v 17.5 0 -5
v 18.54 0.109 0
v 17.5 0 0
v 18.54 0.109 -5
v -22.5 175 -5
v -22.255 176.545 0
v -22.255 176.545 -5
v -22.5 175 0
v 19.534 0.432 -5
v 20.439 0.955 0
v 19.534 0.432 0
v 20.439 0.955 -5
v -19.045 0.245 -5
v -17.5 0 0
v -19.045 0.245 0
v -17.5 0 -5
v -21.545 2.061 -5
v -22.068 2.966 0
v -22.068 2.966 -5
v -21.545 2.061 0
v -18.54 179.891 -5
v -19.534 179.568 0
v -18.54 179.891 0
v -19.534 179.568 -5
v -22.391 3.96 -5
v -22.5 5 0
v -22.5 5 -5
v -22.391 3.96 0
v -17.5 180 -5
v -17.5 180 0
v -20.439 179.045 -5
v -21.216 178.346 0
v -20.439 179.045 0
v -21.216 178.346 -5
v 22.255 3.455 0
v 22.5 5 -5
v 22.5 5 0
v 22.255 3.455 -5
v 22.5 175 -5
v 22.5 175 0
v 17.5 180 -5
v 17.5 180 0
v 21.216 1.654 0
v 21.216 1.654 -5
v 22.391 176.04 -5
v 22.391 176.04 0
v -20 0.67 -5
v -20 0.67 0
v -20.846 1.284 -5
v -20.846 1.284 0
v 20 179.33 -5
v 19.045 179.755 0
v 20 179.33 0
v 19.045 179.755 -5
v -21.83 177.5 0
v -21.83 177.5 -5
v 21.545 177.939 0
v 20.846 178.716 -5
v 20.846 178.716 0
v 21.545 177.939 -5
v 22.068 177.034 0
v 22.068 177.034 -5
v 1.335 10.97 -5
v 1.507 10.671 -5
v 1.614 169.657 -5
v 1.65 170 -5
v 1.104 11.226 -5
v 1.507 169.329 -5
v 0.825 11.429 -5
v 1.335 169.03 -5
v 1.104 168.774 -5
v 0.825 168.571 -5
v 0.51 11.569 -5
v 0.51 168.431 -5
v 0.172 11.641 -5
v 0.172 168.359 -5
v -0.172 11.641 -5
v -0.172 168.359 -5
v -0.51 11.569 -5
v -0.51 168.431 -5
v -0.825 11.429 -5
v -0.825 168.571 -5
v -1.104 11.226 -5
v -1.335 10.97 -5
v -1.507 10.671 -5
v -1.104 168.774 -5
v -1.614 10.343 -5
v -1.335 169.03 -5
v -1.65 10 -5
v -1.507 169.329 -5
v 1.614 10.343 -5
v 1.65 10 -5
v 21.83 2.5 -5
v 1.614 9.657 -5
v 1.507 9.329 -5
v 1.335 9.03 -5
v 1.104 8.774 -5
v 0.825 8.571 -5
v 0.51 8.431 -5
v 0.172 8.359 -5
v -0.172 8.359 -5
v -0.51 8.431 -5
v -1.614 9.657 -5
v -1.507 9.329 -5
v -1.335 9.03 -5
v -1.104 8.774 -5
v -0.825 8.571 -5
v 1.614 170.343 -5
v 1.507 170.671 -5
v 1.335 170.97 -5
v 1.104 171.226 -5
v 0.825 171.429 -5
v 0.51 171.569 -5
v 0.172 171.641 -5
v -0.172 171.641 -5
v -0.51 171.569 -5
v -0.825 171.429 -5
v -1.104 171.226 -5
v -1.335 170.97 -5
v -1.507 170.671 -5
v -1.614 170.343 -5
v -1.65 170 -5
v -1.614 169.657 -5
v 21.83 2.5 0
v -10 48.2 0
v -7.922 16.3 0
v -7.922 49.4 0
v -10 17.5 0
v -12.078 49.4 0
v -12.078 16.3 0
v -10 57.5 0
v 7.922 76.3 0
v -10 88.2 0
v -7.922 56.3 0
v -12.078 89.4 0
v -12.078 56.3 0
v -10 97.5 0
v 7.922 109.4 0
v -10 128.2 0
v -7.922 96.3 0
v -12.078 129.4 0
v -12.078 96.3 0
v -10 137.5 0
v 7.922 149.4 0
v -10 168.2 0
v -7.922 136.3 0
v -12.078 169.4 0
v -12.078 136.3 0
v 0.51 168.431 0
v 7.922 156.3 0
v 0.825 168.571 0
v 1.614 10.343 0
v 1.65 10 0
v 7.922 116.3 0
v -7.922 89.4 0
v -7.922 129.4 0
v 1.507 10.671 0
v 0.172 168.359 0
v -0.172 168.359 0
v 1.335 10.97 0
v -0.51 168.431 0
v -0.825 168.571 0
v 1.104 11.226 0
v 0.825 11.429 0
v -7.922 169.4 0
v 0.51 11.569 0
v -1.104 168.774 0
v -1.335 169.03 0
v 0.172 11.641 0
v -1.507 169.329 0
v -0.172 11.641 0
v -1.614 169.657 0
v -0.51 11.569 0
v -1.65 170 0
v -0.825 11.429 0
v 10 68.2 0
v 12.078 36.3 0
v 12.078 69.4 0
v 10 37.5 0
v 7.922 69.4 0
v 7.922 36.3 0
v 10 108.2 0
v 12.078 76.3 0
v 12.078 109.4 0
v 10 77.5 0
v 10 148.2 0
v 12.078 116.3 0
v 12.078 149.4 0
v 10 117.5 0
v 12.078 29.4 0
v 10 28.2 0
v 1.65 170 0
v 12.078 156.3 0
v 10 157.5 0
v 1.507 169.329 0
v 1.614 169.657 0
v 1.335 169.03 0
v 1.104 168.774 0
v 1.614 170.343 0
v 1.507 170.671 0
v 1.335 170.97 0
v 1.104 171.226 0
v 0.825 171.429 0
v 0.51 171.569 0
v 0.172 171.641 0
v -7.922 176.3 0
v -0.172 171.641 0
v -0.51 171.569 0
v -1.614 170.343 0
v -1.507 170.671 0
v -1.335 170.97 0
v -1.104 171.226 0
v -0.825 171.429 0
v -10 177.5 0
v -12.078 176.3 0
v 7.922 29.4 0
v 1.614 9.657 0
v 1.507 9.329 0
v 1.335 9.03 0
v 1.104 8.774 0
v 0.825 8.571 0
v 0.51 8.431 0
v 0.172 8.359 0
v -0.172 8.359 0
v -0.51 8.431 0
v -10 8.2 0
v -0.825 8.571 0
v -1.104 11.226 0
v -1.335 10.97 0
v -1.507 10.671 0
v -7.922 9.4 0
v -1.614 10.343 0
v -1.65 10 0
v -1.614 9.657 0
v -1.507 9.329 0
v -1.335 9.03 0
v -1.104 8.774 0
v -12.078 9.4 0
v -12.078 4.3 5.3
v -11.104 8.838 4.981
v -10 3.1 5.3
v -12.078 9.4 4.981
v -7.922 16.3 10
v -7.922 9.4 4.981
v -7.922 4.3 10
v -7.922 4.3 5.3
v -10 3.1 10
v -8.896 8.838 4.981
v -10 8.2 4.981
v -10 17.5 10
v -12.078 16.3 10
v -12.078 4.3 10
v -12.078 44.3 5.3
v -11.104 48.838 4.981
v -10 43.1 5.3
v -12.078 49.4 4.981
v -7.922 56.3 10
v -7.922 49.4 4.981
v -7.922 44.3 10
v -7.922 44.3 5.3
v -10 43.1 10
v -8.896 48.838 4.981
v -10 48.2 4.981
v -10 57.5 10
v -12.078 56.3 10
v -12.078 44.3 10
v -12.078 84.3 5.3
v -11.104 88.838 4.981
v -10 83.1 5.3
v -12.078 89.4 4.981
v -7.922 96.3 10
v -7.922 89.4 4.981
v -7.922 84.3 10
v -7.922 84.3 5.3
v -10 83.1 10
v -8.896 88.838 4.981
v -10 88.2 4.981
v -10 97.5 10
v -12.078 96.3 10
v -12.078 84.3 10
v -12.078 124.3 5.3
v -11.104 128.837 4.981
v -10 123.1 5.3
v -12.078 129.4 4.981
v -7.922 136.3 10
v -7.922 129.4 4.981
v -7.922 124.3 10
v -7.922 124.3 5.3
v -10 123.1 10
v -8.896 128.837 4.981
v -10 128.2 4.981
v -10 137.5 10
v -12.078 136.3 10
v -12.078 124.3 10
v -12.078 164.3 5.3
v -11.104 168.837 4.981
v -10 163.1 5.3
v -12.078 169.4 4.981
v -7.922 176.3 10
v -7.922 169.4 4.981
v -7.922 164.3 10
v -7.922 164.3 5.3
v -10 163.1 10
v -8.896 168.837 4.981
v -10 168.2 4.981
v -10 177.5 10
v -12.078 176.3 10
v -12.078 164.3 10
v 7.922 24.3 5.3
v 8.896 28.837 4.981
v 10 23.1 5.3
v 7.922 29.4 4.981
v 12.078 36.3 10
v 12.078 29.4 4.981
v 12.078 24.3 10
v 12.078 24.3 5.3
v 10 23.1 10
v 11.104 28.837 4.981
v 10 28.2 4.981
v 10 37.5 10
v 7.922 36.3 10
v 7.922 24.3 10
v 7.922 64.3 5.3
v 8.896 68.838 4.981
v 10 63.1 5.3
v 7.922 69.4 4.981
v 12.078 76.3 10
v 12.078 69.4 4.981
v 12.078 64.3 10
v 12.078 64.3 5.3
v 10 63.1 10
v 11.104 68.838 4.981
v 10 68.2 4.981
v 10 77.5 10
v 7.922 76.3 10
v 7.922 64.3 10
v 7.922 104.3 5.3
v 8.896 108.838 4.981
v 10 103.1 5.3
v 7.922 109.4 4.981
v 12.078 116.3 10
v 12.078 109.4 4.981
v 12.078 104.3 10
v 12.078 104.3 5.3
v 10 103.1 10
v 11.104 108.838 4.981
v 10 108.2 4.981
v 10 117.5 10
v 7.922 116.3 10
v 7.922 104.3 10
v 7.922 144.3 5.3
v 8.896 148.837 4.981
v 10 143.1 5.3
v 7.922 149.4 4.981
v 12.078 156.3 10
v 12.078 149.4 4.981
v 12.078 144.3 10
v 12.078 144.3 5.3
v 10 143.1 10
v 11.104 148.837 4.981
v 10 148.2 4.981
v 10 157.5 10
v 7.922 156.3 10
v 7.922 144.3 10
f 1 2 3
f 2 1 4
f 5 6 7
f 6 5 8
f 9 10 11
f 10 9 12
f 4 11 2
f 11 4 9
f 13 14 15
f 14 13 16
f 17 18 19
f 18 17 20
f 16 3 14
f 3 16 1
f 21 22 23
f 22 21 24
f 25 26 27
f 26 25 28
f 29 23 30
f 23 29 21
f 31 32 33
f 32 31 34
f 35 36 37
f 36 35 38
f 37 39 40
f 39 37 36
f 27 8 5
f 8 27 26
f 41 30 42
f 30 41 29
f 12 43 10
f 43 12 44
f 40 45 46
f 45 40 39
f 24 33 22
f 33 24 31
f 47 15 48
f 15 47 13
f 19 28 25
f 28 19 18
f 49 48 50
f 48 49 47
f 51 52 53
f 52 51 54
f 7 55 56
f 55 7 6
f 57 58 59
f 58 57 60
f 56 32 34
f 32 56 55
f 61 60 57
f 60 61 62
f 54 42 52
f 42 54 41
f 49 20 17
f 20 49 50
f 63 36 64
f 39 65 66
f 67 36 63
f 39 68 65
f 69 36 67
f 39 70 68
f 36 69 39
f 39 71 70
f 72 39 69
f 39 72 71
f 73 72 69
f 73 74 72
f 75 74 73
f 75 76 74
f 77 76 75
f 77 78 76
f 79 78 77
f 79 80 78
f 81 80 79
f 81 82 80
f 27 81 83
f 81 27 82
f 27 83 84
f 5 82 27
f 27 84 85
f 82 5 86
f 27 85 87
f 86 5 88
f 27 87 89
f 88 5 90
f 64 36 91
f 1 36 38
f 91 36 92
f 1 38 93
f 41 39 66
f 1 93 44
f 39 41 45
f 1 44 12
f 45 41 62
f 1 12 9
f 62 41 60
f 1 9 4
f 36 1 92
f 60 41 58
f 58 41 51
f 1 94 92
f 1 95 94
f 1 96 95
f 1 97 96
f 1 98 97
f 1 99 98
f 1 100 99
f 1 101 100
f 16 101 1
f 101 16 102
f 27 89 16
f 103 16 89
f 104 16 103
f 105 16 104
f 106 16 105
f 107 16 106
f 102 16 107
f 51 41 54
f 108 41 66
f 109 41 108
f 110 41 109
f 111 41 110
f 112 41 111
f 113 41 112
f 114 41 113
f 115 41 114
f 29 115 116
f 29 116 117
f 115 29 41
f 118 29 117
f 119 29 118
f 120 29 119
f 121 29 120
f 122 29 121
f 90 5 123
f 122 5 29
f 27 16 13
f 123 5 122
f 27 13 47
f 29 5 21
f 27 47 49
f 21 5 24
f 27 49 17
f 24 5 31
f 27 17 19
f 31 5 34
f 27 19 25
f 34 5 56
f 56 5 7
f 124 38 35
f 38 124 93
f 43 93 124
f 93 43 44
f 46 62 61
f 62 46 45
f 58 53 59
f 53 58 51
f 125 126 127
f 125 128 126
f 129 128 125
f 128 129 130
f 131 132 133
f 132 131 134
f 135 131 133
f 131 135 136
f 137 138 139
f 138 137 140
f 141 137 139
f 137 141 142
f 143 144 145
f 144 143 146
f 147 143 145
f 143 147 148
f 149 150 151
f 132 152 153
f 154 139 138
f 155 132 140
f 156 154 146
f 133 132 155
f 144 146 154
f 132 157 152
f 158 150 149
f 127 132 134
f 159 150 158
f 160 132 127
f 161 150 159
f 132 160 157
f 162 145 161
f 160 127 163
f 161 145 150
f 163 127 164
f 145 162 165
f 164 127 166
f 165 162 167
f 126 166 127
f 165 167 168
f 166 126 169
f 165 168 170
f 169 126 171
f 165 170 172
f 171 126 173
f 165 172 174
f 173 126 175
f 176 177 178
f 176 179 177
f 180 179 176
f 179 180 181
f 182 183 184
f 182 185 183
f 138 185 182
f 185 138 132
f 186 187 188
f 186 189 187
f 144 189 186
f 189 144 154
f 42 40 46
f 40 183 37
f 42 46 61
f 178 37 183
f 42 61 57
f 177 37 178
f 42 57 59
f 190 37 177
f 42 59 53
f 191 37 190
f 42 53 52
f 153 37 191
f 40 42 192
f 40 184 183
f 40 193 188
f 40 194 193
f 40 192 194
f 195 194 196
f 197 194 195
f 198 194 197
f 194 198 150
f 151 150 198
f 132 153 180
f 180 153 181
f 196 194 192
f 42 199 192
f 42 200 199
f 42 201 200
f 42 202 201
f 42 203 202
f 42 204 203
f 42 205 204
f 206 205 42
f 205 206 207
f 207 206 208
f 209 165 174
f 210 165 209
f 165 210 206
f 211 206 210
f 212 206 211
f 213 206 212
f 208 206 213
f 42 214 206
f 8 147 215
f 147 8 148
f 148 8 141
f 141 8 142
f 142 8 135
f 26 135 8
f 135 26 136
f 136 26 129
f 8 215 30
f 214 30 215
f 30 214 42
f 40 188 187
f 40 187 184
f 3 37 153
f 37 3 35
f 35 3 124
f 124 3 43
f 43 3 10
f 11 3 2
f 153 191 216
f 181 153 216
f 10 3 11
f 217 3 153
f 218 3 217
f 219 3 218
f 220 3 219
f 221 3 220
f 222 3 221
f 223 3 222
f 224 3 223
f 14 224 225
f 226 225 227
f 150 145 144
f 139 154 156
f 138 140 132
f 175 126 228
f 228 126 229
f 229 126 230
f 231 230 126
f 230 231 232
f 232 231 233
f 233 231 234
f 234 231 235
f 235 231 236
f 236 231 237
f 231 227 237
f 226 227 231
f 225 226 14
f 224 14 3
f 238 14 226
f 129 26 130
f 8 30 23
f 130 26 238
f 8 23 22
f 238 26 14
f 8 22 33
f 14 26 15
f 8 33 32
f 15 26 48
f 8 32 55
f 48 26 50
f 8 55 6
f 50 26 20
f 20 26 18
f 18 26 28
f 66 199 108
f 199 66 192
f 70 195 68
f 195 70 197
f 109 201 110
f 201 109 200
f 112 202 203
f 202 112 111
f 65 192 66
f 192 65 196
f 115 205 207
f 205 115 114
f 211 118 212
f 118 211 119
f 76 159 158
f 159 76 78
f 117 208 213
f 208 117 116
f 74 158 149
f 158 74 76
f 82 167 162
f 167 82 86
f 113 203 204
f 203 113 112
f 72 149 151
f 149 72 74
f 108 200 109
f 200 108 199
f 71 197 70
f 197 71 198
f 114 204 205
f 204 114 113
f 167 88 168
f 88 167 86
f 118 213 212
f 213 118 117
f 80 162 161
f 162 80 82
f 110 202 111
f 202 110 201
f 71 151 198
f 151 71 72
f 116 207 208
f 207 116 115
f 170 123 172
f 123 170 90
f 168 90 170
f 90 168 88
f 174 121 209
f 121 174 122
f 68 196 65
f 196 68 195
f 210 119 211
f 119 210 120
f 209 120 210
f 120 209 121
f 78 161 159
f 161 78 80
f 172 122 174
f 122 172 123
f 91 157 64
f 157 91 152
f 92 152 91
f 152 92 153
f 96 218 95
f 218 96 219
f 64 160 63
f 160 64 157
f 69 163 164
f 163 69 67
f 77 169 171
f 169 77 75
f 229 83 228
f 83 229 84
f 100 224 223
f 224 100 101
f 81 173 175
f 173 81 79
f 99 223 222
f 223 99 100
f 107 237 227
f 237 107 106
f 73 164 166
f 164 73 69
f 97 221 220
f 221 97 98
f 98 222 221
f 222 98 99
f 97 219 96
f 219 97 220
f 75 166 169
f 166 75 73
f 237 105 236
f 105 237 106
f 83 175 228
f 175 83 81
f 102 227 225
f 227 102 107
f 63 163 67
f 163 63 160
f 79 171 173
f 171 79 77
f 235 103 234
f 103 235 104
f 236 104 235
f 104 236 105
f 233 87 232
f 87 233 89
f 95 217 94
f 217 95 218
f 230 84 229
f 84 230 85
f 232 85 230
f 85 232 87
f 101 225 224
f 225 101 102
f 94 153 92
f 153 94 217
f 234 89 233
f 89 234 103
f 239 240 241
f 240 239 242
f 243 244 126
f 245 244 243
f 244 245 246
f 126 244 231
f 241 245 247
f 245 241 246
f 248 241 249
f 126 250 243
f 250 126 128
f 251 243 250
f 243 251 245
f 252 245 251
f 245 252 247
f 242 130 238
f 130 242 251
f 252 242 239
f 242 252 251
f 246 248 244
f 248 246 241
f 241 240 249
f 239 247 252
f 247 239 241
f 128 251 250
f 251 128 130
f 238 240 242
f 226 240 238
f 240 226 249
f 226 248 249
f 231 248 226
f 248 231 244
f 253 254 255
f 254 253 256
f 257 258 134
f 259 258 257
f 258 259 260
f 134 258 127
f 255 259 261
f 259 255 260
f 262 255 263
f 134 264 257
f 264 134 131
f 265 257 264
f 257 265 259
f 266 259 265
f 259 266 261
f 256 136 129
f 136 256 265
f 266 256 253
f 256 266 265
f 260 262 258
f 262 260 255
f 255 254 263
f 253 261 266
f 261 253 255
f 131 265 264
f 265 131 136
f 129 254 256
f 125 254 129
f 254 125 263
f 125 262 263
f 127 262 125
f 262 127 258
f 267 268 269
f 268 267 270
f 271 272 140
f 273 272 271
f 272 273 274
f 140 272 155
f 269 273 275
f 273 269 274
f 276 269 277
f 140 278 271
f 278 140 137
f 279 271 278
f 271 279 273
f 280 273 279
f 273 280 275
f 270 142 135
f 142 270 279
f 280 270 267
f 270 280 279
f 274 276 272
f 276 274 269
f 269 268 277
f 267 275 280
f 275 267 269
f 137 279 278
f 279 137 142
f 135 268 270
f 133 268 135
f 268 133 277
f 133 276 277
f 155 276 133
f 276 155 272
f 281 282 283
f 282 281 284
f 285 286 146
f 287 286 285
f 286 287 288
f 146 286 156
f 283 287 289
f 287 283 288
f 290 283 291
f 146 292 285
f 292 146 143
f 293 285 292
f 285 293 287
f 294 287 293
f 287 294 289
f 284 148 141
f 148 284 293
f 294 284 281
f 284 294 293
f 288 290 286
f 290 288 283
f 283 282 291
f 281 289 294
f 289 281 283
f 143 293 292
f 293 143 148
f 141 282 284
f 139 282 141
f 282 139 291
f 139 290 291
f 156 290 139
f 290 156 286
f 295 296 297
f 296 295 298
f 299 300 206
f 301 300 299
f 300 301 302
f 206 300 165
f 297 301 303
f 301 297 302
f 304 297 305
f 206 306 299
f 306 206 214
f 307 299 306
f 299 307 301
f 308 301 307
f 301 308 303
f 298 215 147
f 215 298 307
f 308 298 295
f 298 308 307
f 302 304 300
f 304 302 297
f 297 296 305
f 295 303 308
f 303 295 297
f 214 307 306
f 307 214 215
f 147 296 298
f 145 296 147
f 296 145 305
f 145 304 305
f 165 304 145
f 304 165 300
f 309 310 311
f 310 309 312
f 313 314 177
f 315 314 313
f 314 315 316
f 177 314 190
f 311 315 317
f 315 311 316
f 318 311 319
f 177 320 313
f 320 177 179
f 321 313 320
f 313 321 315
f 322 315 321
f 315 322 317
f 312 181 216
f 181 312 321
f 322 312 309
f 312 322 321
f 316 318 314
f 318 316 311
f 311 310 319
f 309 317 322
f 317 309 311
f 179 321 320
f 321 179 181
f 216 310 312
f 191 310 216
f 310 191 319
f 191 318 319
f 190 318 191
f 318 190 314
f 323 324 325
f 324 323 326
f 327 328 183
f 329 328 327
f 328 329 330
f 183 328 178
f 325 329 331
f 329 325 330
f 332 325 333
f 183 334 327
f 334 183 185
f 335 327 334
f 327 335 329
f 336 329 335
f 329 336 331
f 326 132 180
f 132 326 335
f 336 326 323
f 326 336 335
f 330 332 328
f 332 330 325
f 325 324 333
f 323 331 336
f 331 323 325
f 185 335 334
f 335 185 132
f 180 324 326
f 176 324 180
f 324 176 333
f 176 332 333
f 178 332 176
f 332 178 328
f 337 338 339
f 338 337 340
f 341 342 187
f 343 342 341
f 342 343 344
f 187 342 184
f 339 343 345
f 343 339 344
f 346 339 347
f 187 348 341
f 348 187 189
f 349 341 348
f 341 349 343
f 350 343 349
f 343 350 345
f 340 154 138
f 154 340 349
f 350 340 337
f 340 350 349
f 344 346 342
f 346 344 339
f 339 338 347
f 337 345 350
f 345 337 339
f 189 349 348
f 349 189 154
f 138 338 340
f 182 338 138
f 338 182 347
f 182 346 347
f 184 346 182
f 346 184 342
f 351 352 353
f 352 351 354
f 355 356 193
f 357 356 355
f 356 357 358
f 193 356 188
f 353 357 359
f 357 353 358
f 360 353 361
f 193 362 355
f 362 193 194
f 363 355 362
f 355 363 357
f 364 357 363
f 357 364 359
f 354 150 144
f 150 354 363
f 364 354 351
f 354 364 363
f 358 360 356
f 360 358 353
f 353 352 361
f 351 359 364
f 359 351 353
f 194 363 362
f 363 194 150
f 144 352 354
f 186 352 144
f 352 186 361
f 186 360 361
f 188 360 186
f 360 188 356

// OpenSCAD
// SKADIS back plate for screws to use with keyhole mounted kit

WIDTH = 45;
KEYHOLE_DISTANCE = 160;
KEYHOLE_TOP_OFFSET = 10;
SCREW_HOLE_DIA = 3.3;
WALL = 5;
ROUNDING = 5;
KEYHOLE_MIN_FROM_EDGE = 10;

HEIGHT = KEYHOLE_DISTANCE + KEYHOLE_TOP_OFFSET + KEYHOLE_MIN_FROM_EDGE;

tiny = 0.01;
$fn=30;

rotate([-90,0,0]) {
  difference() {
    // Rear plate
    translate([-WIDTH/2, WALL, 0])
      rotate ([90,0,0]) linear_extrude(WALL) offset(ROUNDING) offset(-ROUNDING) square([WIDTH, HEIGHT]);

    // Screw holes
    translate([0, WALL+tiny, HEIGHT-KEYHOLE_TOP_OFFSET]) rotate([90,0,0]) cylinder(d=SCREW_HOLE_DIA, WALL+2*tiny);
    translate([0, WALL+tiny, HEIGHT-KEYHOLE_TOP_OFFSET-KEYHOLE_DISTANCE]) rotate([90,0,0]) cylinder(d=SCREW_HOLE_DIA, WALL+2*tiny);
  }

  // Hooks
  translate([-WIDTH/2,0,0]) hooks(WIDTH, HEIGHT, sparse=true, min_edge=10);
}

module hooks(x, y, sparse=true, min_edge=10) {
  hook_width = 5;
  hook_height = 15;
  cols = floor((x - 2*min_edge - hook_width)/20)+1;
  offsetX = (x - ((cols-1)*20)) / 2;
  echo("cols", cols)
  echo("offsetX", offsetX);

  rows = floor((y - 2*min_edge)/40)+1;
  offsetY = (hook_height/2) + (y - ((rows)*40)) / 2;
  echo("rows", rows)
  echo("offsetY", offsetY);

  translate([offsetX, 0, offsetY])
  for (col = [0:1:cols-1]) {
    for (row = [0:1:rows-1]) {
      inbetween_offset = col % 2 ? 0 : 20;
      is_bottom_row = col % 2 == 0 ? row == 0 : row == 1;
      if (!sparse ||
          col == 0 || 
          col == cols-1 ||
          is_bottom_row ||
          row == rows-1) {
        //color(is_bottom_row ? "red" : "black")
        if (inbetween_offset + row * 40 > 0)
          translate([col * 20, 0, inbetween_offset + row * 40]) hook();
      }
    }
  }
  
//  for (col = [0:1:cols-2]) {
//    for (row = [0:1:rows-2]) {
//      if (!sparse ||
//          col == 0 || 
//          col == cols-2 ||
//          row == 0 ||
//          row == rows-2) {
//        translate([20 + offsetX + col * 40, 0, offsetY + 20 + 20 + row * 40]) hook();
//      }
//    }
//  }

  
//  for (a = [offsetX + 20:40:x]) {
//    for (b = [40:40:y]) {
//      #translate([a,0,b]) hook();
//    }
//  }
}

module hook() {
  // t is the amount we reduce the width/height by to let it fit ok
  t = 0.1;
  // w = width
  w = 5;
  // wt is the width less the t
  wt = w - t * 2;
  // h is the hight less a bit to make it fit
  h = 15 - 0.3;
  // h2 is the height of the smaller part of the peg
  h2 = h - 5;
  // ht is the height less t
  ht = h - t;
  // d is the depth of the board
  d = 5;
  // 12 gives us enough facets to create a easy to print angle
  $fn = 6;

  translate([0, -d*2, -wt/2]) rotate([270, 90,0]) union() {
    // The larger part of the peg
    hull() {
      cylinder(d=wt, h=d + 0.3);
      // -0.3 is the taper applied to the face that makes contact with the back on the pegboard
      translate([ht-w, 0, 0]) cylinder(d=wt, h=d -0.3);
    }
    // The smaller part of the peg
    translate([0, 0, 0]) hull() {
      cylinder(d=wt, h = d * 2);
      translate([h2 - w - t * 2 ,0 ,0]) cylinder(d=wt, h=d * 2);
      };
  }
}
